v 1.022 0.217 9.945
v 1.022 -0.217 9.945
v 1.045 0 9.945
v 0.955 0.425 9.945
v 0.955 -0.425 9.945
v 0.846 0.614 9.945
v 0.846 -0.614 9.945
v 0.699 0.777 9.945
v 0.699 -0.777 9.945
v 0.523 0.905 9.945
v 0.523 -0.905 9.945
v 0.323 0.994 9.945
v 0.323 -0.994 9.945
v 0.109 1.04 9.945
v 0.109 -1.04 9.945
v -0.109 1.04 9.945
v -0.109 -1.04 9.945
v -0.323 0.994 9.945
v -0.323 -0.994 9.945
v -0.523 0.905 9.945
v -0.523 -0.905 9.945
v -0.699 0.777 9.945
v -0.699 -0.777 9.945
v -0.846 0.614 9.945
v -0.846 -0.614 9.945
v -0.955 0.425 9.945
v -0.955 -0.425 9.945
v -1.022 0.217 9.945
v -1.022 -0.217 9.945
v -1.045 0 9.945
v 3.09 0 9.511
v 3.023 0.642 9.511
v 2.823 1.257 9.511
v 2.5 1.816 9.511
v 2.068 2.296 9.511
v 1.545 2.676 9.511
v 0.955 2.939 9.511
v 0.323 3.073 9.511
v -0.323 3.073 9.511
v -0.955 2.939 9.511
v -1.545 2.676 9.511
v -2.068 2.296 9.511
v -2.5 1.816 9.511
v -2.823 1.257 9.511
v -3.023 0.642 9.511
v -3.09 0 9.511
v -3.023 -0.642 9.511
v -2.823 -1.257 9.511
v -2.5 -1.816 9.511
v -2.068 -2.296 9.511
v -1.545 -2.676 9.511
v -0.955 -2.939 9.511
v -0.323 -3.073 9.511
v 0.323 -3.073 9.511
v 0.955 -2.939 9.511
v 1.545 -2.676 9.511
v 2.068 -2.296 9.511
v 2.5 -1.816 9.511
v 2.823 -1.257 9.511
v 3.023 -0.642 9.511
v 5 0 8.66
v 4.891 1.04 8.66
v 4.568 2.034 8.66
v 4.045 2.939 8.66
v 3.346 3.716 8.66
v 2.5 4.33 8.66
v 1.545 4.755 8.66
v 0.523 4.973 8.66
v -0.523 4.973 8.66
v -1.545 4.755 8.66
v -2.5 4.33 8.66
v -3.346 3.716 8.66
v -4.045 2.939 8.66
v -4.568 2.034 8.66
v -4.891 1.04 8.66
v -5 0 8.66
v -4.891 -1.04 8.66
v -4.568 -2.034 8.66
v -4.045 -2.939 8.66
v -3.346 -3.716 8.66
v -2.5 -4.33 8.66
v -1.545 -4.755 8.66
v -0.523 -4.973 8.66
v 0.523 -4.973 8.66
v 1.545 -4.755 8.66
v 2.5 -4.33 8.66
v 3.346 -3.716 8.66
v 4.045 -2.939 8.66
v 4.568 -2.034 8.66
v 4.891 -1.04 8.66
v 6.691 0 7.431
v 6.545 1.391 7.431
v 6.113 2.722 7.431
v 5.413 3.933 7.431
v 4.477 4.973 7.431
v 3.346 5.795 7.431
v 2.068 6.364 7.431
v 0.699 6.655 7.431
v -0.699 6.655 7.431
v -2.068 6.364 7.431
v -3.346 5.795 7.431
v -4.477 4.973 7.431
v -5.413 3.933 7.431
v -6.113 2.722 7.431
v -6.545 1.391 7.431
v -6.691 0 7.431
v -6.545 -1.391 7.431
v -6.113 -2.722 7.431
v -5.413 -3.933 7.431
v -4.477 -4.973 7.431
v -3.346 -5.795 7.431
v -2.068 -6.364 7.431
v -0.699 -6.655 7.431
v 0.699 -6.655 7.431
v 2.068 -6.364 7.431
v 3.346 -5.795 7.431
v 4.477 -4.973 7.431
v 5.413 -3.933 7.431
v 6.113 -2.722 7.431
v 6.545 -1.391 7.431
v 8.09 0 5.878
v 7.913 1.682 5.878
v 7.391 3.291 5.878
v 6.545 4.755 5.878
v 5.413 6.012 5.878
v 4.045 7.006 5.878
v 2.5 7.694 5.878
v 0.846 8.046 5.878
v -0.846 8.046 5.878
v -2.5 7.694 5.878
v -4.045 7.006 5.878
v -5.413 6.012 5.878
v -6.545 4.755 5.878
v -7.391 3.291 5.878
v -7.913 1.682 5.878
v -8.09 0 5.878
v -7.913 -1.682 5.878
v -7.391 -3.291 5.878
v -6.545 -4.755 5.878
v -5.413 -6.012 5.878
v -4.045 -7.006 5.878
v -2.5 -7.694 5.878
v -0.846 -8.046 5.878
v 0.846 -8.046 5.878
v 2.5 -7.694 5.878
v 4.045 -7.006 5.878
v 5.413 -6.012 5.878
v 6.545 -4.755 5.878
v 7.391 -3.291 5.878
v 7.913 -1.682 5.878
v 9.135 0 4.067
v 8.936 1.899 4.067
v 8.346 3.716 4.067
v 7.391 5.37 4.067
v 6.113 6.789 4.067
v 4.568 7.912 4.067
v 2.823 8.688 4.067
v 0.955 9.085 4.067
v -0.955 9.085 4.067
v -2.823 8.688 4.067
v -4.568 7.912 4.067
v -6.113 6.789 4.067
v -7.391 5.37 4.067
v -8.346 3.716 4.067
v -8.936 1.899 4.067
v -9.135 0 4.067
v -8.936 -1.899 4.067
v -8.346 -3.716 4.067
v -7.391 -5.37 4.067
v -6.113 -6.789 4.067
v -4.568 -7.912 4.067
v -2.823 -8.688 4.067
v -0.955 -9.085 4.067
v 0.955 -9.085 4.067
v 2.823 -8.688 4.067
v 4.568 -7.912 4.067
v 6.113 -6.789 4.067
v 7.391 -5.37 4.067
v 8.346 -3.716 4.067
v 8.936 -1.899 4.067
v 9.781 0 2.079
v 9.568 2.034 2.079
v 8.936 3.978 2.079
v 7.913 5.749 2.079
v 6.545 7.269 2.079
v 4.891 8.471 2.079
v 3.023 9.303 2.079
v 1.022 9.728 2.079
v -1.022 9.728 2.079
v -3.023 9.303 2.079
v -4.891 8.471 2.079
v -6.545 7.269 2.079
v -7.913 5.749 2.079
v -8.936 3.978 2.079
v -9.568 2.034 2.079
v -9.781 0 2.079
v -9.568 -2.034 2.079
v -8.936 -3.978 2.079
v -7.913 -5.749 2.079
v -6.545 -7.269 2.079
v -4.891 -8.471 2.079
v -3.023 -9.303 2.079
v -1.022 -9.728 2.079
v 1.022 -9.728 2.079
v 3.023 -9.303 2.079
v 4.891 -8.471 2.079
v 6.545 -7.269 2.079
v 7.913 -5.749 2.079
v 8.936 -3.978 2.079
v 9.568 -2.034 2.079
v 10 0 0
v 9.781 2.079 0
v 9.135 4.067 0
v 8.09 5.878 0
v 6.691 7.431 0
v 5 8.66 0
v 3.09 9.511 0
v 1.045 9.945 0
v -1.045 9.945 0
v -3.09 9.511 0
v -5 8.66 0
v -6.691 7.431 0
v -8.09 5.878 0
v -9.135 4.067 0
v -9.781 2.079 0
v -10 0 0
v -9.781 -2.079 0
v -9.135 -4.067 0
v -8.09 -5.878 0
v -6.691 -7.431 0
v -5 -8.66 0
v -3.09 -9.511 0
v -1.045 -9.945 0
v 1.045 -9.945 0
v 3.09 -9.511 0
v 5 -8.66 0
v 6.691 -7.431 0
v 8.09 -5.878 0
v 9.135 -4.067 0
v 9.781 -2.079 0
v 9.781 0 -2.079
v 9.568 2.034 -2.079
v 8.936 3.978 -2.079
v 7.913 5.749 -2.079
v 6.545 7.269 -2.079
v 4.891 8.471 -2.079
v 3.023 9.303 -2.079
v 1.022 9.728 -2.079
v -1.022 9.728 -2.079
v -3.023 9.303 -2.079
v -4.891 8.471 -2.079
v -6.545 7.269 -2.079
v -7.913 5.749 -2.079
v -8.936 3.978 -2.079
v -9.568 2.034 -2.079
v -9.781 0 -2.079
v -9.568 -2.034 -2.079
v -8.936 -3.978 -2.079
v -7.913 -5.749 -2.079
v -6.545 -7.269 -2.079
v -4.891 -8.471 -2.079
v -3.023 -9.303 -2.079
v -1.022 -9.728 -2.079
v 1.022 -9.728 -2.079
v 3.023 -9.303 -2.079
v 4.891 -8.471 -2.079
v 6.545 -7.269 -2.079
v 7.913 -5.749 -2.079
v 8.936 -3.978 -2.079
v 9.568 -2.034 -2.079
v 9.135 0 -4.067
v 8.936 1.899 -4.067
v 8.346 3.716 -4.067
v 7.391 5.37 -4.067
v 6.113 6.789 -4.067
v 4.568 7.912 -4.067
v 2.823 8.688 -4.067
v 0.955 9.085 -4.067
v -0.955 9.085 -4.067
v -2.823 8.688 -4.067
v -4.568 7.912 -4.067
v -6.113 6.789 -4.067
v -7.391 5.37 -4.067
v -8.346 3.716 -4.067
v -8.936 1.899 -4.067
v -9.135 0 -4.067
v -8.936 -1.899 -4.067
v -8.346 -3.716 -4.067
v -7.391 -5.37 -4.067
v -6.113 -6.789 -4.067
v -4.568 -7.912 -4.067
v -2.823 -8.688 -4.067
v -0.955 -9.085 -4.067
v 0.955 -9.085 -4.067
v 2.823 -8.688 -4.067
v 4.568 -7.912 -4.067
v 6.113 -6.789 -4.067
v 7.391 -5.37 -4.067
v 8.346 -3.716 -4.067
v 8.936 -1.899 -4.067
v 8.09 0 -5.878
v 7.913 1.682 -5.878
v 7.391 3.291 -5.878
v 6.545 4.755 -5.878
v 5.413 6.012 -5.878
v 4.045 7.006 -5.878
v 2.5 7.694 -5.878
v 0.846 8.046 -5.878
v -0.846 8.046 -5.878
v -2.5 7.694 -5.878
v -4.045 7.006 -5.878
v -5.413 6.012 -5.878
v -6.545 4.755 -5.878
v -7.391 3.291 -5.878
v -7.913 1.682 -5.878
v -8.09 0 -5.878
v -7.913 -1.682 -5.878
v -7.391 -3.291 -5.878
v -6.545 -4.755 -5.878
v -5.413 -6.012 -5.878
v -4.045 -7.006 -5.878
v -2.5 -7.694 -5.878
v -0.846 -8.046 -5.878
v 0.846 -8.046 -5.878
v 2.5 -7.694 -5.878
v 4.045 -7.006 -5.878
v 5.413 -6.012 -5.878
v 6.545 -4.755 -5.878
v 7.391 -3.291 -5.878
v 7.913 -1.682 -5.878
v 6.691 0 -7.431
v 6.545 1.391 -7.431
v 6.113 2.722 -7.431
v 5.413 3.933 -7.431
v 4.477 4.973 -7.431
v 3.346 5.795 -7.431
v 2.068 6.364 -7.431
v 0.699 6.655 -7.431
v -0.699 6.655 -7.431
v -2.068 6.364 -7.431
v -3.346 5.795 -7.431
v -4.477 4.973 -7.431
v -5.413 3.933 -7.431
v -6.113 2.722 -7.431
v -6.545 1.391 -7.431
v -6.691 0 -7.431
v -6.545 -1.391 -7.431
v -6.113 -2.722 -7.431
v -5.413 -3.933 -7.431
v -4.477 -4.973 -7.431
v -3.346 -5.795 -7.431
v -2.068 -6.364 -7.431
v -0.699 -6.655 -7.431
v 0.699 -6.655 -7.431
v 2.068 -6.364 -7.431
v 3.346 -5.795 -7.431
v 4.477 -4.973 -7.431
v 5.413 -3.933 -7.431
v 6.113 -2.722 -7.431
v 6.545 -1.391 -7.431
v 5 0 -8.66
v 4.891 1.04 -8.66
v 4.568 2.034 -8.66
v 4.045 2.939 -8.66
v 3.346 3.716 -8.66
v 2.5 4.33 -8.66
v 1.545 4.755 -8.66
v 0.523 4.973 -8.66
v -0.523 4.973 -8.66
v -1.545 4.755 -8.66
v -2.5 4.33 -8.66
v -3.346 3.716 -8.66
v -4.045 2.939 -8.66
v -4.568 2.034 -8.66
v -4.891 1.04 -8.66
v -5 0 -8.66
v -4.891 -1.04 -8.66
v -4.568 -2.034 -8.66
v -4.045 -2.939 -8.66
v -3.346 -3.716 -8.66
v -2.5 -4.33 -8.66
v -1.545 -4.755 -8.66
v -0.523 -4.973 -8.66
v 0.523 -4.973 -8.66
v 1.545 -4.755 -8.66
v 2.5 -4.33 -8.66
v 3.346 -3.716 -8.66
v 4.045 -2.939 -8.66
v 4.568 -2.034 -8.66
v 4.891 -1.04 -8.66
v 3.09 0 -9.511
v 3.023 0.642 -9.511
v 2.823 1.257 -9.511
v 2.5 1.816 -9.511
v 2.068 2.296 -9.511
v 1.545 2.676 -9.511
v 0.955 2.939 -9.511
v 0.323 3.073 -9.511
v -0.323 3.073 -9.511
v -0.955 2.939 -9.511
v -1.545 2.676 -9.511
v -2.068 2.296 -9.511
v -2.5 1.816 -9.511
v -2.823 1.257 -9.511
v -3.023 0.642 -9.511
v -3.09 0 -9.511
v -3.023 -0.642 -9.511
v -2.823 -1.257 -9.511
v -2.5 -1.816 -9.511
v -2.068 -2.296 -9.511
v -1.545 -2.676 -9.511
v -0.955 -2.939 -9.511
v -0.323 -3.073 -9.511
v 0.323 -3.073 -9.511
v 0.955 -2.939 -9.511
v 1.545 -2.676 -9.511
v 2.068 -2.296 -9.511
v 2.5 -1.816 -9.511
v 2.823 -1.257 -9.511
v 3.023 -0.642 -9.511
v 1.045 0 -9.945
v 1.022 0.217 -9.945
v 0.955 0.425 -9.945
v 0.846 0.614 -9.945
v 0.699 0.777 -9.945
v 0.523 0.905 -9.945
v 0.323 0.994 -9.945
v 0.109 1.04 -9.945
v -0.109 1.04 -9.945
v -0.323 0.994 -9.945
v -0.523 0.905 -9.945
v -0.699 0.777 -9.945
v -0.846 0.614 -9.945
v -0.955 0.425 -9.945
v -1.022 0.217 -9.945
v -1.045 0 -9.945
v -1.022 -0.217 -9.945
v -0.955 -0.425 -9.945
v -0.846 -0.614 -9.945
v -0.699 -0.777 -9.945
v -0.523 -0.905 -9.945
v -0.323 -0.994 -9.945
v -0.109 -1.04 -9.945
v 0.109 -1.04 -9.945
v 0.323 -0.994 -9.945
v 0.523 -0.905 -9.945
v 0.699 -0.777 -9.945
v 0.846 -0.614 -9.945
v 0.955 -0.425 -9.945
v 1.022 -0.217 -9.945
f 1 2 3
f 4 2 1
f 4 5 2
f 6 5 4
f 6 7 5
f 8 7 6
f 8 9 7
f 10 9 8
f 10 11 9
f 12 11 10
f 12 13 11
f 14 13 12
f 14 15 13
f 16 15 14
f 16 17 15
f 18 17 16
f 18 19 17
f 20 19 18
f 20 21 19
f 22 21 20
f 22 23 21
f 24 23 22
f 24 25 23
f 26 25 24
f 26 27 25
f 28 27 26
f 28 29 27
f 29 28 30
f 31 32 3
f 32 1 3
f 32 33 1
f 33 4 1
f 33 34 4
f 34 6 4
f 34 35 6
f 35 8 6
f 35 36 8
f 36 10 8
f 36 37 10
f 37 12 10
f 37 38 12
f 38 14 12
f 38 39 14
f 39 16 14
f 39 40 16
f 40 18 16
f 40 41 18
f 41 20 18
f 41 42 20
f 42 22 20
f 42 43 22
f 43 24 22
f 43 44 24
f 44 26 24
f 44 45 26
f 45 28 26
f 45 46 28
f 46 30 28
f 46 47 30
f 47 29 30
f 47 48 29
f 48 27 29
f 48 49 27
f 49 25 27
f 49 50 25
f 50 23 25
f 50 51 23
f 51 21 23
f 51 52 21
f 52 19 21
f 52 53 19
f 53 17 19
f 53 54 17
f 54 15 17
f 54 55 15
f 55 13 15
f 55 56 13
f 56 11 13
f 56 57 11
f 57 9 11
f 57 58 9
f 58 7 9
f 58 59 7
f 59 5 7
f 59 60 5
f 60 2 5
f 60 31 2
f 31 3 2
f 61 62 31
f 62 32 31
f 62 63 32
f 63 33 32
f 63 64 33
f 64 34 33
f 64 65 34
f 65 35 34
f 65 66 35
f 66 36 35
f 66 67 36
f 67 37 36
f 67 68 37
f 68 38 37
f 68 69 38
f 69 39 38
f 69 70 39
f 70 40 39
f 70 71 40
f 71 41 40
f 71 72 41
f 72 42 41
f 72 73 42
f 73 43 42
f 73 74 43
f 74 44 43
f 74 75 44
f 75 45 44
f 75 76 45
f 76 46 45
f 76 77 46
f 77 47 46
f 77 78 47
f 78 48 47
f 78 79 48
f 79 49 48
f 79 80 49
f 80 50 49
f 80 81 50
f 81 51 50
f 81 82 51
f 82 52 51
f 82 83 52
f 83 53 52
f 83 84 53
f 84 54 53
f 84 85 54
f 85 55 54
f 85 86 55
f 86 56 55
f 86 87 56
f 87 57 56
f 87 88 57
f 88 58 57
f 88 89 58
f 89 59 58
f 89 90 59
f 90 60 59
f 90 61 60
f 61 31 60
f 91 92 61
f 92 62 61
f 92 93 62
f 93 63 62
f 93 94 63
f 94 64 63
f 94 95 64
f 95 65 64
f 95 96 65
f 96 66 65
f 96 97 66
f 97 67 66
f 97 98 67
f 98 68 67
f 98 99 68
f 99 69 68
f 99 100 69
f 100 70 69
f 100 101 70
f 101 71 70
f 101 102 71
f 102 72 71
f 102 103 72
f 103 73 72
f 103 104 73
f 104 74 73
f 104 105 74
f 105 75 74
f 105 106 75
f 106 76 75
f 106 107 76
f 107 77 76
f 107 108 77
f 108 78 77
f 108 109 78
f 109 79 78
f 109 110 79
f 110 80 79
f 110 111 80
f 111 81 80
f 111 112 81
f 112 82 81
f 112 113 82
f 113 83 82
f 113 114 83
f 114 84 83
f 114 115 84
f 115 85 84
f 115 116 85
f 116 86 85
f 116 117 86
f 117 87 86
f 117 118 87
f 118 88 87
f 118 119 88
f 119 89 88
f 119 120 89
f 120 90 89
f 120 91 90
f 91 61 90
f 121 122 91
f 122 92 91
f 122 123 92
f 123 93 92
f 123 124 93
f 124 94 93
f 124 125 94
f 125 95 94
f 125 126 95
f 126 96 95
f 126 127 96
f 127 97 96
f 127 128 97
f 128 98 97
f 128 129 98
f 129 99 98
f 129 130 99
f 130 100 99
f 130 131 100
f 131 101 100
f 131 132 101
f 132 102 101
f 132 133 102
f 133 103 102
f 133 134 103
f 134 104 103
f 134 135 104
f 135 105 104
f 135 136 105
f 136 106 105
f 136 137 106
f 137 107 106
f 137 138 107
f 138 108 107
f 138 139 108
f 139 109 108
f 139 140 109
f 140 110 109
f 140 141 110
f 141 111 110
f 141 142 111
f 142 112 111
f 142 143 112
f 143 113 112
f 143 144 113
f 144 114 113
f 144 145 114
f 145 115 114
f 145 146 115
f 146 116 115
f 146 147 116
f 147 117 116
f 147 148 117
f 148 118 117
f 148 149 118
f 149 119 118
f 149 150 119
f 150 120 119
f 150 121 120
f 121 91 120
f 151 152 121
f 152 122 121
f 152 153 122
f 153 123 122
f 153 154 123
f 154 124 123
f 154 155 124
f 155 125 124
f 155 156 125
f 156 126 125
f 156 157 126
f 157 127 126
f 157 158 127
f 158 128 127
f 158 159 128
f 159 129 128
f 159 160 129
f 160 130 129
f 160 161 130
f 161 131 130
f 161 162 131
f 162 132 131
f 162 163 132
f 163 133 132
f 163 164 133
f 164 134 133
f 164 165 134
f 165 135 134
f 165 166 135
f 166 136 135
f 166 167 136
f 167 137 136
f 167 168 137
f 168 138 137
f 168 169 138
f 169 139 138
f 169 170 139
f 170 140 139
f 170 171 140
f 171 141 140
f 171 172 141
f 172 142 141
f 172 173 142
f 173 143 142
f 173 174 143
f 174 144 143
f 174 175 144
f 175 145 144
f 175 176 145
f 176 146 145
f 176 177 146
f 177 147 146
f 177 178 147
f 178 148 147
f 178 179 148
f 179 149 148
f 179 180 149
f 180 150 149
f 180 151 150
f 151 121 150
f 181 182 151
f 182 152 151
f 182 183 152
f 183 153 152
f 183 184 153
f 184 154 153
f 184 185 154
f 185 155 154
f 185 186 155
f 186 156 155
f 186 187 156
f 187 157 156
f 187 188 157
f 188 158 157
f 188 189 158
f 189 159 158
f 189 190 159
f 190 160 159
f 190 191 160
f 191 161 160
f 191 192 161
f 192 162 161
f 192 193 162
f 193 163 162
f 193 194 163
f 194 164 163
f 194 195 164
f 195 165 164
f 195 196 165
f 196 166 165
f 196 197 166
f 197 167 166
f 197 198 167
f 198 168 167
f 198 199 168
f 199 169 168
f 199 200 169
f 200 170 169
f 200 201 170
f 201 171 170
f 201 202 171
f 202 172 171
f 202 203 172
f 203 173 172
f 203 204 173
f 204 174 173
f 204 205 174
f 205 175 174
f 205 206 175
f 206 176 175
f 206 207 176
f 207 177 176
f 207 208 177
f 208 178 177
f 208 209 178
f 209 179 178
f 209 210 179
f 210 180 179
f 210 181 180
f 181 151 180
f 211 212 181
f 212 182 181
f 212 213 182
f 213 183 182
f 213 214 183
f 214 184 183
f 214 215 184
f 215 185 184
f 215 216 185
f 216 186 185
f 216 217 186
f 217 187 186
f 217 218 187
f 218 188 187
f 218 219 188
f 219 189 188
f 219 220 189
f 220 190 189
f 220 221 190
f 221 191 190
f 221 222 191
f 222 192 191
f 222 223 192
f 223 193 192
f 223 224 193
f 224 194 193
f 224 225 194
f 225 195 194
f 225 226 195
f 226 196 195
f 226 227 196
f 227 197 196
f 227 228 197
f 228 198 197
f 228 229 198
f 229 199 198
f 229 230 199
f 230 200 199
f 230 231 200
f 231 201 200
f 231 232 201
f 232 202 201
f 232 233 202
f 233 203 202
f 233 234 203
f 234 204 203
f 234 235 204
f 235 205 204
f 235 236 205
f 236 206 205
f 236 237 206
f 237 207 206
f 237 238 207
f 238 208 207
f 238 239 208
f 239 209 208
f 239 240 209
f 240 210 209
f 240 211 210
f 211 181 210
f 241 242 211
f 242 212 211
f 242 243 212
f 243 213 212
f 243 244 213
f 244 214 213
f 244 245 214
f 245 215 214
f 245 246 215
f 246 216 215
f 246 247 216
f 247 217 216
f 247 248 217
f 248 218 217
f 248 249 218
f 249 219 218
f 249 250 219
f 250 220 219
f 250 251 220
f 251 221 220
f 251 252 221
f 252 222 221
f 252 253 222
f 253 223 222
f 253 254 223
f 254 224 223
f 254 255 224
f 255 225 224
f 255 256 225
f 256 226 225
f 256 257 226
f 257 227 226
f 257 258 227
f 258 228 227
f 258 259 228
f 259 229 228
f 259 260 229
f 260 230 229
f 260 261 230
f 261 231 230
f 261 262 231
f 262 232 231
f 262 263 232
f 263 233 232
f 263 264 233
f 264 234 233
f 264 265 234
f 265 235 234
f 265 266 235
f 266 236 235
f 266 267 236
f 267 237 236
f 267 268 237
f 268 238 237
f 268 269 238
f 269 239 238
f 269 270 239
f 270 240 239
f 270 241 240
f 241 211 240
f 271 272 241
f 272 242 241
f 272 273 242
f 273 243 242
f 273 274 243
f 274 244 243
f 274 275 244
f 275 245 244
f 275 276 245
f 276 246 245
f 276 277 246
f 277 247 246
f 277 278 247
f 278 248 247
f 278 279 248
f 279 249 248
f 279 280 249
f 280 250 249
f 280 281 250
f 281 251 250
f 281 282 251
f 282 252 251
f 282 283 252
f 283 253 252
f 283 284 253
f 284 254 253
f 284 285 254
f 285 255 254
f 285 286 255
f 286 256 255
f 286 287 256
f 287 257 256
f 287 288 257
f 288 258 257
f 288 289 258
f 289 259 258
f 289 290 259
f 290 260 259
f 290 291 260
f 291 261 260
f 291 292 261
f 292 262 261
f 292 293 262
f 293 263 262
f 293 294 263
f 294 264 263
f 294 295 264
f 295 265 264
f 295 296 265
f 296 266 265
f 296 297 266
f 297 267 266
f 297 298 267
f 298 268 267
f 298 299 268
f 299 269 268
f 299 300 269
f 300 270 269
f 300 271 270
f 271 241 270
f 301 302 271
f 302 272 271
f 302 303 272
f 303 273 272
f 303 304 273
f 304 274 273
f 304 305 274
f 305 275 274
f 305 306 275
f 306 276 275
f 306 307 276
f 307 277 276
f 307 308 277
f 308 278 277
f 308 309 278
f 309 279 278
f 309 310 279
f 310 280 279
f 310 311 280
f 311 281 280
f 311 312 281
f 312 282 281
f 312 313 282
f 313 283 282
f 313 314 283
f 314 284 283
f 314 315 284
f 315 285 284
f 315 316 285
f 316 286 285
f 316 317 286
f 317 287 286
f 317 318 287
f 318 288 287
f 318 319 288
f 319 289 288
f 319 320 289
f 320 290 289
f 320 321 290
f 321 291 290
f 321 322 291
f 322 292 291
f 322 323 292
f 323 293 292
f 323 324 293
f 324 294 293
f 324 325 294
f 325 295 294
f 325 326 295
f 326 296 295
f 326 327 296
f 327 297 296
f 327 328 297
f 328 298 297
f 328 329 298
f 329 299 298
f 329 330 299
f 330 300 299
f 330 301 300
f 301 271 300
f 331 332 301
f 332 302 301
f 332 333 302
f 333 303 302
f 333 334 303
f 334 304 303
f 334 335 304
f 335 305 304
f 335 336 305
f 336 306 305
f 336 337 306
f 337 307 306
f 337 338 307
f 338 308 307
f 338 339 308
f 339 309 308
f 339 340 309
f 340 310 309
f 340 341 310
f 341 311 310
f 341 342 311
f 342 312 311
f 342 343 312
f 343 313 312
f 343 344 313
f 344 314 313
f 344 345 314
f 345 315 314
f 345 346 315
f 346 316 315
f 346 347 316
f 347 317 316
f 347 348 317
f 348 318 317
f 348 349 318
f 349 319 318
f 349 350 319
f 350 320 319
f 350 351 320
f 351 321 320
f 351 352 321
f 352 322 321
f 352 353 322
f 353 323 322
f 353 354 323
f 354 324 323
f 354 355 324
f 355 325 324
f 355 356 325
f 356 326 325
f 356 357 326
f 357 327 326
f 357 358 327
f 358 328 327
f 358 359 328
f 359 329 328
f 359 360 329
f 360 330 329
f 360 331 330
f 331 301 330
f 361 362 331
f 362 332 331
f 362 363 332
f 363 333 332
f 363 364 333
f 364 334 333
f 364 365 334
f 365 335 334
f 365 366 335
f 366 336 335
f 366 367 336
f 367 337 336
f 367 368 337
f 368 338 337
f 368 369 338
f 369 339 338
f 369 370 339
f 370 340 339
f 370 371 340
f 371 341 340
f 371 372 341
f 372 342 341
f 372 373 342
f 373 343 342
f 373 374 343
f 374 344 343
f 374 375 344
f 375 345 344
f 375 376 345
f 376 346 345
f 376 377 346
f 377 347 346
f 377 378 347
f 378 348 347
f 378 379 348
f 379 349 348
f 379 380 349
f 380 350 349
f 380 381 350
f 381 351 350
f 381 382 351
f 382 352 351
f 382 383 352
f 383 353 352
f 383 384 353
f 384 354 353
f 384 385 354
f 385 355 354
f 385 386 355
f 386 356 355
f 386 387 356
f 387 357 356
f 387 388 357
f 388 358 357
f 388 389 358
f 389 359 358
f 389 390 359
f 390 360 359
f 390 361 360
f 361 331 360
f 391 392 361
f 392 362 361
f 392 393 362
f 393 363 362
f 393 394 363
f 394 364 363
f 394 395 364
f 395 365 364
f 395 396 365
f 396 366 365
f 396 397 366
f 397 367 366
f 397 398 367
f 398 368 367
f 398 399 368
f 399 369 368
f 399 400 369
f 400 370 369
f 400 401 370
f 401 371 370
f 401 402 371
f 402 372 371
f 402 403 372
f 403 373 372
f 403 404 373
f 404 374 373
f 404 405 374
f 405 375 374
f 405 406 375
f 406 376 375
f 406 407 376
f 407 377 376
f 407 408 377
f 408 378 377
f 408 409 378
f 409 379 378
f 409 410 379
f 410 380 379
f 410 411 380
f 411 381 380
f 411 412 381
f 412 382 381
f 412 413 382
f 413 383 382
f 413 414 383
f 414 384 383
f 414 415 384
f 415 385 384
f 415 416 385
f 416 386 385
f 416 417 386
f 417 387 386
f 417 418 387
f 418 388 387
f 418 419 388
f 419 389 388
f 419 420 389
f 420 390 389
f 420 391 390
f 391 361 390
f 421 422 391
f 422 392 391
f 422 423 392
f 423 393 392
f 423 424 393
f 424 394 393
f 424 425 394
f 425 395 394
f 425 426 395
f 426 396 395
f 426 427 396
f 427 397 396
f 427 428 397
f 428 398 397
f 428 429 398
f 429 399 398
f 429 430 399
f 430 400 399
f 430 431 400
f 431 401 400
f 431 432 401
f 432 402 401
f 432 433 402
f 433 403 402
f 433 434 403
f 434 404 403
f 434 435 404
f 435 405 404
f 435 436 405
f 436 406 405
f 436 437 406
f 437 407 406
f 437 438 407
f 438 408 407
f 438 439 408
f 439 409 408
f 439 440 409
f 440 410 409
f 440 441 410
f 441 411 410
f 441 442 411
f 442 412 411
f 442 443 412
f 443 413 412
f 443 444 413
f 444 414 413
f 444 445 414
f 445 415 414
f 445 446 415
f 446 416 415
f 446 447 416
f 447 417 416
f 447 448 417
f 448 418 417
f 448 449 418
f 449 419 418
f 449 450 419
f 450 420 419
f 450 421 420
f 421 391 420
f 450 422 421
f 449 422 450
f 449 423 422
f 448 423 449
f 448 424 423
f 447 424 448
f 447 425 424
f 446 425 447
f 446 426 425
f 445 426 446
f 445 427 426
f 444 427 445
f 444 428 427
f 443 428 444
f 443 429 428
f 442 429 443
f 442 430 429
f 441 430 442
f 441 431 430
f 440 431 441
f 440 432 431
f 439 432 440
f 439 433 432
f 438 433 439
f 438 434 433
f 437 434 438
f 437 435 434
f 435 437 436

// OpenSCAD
// Generated by CadMonkey
// Prompt: hey cadmonkey, create me a sphere
// Generated at: 2025-11-10 21:29:59

sphere(r = 10);
